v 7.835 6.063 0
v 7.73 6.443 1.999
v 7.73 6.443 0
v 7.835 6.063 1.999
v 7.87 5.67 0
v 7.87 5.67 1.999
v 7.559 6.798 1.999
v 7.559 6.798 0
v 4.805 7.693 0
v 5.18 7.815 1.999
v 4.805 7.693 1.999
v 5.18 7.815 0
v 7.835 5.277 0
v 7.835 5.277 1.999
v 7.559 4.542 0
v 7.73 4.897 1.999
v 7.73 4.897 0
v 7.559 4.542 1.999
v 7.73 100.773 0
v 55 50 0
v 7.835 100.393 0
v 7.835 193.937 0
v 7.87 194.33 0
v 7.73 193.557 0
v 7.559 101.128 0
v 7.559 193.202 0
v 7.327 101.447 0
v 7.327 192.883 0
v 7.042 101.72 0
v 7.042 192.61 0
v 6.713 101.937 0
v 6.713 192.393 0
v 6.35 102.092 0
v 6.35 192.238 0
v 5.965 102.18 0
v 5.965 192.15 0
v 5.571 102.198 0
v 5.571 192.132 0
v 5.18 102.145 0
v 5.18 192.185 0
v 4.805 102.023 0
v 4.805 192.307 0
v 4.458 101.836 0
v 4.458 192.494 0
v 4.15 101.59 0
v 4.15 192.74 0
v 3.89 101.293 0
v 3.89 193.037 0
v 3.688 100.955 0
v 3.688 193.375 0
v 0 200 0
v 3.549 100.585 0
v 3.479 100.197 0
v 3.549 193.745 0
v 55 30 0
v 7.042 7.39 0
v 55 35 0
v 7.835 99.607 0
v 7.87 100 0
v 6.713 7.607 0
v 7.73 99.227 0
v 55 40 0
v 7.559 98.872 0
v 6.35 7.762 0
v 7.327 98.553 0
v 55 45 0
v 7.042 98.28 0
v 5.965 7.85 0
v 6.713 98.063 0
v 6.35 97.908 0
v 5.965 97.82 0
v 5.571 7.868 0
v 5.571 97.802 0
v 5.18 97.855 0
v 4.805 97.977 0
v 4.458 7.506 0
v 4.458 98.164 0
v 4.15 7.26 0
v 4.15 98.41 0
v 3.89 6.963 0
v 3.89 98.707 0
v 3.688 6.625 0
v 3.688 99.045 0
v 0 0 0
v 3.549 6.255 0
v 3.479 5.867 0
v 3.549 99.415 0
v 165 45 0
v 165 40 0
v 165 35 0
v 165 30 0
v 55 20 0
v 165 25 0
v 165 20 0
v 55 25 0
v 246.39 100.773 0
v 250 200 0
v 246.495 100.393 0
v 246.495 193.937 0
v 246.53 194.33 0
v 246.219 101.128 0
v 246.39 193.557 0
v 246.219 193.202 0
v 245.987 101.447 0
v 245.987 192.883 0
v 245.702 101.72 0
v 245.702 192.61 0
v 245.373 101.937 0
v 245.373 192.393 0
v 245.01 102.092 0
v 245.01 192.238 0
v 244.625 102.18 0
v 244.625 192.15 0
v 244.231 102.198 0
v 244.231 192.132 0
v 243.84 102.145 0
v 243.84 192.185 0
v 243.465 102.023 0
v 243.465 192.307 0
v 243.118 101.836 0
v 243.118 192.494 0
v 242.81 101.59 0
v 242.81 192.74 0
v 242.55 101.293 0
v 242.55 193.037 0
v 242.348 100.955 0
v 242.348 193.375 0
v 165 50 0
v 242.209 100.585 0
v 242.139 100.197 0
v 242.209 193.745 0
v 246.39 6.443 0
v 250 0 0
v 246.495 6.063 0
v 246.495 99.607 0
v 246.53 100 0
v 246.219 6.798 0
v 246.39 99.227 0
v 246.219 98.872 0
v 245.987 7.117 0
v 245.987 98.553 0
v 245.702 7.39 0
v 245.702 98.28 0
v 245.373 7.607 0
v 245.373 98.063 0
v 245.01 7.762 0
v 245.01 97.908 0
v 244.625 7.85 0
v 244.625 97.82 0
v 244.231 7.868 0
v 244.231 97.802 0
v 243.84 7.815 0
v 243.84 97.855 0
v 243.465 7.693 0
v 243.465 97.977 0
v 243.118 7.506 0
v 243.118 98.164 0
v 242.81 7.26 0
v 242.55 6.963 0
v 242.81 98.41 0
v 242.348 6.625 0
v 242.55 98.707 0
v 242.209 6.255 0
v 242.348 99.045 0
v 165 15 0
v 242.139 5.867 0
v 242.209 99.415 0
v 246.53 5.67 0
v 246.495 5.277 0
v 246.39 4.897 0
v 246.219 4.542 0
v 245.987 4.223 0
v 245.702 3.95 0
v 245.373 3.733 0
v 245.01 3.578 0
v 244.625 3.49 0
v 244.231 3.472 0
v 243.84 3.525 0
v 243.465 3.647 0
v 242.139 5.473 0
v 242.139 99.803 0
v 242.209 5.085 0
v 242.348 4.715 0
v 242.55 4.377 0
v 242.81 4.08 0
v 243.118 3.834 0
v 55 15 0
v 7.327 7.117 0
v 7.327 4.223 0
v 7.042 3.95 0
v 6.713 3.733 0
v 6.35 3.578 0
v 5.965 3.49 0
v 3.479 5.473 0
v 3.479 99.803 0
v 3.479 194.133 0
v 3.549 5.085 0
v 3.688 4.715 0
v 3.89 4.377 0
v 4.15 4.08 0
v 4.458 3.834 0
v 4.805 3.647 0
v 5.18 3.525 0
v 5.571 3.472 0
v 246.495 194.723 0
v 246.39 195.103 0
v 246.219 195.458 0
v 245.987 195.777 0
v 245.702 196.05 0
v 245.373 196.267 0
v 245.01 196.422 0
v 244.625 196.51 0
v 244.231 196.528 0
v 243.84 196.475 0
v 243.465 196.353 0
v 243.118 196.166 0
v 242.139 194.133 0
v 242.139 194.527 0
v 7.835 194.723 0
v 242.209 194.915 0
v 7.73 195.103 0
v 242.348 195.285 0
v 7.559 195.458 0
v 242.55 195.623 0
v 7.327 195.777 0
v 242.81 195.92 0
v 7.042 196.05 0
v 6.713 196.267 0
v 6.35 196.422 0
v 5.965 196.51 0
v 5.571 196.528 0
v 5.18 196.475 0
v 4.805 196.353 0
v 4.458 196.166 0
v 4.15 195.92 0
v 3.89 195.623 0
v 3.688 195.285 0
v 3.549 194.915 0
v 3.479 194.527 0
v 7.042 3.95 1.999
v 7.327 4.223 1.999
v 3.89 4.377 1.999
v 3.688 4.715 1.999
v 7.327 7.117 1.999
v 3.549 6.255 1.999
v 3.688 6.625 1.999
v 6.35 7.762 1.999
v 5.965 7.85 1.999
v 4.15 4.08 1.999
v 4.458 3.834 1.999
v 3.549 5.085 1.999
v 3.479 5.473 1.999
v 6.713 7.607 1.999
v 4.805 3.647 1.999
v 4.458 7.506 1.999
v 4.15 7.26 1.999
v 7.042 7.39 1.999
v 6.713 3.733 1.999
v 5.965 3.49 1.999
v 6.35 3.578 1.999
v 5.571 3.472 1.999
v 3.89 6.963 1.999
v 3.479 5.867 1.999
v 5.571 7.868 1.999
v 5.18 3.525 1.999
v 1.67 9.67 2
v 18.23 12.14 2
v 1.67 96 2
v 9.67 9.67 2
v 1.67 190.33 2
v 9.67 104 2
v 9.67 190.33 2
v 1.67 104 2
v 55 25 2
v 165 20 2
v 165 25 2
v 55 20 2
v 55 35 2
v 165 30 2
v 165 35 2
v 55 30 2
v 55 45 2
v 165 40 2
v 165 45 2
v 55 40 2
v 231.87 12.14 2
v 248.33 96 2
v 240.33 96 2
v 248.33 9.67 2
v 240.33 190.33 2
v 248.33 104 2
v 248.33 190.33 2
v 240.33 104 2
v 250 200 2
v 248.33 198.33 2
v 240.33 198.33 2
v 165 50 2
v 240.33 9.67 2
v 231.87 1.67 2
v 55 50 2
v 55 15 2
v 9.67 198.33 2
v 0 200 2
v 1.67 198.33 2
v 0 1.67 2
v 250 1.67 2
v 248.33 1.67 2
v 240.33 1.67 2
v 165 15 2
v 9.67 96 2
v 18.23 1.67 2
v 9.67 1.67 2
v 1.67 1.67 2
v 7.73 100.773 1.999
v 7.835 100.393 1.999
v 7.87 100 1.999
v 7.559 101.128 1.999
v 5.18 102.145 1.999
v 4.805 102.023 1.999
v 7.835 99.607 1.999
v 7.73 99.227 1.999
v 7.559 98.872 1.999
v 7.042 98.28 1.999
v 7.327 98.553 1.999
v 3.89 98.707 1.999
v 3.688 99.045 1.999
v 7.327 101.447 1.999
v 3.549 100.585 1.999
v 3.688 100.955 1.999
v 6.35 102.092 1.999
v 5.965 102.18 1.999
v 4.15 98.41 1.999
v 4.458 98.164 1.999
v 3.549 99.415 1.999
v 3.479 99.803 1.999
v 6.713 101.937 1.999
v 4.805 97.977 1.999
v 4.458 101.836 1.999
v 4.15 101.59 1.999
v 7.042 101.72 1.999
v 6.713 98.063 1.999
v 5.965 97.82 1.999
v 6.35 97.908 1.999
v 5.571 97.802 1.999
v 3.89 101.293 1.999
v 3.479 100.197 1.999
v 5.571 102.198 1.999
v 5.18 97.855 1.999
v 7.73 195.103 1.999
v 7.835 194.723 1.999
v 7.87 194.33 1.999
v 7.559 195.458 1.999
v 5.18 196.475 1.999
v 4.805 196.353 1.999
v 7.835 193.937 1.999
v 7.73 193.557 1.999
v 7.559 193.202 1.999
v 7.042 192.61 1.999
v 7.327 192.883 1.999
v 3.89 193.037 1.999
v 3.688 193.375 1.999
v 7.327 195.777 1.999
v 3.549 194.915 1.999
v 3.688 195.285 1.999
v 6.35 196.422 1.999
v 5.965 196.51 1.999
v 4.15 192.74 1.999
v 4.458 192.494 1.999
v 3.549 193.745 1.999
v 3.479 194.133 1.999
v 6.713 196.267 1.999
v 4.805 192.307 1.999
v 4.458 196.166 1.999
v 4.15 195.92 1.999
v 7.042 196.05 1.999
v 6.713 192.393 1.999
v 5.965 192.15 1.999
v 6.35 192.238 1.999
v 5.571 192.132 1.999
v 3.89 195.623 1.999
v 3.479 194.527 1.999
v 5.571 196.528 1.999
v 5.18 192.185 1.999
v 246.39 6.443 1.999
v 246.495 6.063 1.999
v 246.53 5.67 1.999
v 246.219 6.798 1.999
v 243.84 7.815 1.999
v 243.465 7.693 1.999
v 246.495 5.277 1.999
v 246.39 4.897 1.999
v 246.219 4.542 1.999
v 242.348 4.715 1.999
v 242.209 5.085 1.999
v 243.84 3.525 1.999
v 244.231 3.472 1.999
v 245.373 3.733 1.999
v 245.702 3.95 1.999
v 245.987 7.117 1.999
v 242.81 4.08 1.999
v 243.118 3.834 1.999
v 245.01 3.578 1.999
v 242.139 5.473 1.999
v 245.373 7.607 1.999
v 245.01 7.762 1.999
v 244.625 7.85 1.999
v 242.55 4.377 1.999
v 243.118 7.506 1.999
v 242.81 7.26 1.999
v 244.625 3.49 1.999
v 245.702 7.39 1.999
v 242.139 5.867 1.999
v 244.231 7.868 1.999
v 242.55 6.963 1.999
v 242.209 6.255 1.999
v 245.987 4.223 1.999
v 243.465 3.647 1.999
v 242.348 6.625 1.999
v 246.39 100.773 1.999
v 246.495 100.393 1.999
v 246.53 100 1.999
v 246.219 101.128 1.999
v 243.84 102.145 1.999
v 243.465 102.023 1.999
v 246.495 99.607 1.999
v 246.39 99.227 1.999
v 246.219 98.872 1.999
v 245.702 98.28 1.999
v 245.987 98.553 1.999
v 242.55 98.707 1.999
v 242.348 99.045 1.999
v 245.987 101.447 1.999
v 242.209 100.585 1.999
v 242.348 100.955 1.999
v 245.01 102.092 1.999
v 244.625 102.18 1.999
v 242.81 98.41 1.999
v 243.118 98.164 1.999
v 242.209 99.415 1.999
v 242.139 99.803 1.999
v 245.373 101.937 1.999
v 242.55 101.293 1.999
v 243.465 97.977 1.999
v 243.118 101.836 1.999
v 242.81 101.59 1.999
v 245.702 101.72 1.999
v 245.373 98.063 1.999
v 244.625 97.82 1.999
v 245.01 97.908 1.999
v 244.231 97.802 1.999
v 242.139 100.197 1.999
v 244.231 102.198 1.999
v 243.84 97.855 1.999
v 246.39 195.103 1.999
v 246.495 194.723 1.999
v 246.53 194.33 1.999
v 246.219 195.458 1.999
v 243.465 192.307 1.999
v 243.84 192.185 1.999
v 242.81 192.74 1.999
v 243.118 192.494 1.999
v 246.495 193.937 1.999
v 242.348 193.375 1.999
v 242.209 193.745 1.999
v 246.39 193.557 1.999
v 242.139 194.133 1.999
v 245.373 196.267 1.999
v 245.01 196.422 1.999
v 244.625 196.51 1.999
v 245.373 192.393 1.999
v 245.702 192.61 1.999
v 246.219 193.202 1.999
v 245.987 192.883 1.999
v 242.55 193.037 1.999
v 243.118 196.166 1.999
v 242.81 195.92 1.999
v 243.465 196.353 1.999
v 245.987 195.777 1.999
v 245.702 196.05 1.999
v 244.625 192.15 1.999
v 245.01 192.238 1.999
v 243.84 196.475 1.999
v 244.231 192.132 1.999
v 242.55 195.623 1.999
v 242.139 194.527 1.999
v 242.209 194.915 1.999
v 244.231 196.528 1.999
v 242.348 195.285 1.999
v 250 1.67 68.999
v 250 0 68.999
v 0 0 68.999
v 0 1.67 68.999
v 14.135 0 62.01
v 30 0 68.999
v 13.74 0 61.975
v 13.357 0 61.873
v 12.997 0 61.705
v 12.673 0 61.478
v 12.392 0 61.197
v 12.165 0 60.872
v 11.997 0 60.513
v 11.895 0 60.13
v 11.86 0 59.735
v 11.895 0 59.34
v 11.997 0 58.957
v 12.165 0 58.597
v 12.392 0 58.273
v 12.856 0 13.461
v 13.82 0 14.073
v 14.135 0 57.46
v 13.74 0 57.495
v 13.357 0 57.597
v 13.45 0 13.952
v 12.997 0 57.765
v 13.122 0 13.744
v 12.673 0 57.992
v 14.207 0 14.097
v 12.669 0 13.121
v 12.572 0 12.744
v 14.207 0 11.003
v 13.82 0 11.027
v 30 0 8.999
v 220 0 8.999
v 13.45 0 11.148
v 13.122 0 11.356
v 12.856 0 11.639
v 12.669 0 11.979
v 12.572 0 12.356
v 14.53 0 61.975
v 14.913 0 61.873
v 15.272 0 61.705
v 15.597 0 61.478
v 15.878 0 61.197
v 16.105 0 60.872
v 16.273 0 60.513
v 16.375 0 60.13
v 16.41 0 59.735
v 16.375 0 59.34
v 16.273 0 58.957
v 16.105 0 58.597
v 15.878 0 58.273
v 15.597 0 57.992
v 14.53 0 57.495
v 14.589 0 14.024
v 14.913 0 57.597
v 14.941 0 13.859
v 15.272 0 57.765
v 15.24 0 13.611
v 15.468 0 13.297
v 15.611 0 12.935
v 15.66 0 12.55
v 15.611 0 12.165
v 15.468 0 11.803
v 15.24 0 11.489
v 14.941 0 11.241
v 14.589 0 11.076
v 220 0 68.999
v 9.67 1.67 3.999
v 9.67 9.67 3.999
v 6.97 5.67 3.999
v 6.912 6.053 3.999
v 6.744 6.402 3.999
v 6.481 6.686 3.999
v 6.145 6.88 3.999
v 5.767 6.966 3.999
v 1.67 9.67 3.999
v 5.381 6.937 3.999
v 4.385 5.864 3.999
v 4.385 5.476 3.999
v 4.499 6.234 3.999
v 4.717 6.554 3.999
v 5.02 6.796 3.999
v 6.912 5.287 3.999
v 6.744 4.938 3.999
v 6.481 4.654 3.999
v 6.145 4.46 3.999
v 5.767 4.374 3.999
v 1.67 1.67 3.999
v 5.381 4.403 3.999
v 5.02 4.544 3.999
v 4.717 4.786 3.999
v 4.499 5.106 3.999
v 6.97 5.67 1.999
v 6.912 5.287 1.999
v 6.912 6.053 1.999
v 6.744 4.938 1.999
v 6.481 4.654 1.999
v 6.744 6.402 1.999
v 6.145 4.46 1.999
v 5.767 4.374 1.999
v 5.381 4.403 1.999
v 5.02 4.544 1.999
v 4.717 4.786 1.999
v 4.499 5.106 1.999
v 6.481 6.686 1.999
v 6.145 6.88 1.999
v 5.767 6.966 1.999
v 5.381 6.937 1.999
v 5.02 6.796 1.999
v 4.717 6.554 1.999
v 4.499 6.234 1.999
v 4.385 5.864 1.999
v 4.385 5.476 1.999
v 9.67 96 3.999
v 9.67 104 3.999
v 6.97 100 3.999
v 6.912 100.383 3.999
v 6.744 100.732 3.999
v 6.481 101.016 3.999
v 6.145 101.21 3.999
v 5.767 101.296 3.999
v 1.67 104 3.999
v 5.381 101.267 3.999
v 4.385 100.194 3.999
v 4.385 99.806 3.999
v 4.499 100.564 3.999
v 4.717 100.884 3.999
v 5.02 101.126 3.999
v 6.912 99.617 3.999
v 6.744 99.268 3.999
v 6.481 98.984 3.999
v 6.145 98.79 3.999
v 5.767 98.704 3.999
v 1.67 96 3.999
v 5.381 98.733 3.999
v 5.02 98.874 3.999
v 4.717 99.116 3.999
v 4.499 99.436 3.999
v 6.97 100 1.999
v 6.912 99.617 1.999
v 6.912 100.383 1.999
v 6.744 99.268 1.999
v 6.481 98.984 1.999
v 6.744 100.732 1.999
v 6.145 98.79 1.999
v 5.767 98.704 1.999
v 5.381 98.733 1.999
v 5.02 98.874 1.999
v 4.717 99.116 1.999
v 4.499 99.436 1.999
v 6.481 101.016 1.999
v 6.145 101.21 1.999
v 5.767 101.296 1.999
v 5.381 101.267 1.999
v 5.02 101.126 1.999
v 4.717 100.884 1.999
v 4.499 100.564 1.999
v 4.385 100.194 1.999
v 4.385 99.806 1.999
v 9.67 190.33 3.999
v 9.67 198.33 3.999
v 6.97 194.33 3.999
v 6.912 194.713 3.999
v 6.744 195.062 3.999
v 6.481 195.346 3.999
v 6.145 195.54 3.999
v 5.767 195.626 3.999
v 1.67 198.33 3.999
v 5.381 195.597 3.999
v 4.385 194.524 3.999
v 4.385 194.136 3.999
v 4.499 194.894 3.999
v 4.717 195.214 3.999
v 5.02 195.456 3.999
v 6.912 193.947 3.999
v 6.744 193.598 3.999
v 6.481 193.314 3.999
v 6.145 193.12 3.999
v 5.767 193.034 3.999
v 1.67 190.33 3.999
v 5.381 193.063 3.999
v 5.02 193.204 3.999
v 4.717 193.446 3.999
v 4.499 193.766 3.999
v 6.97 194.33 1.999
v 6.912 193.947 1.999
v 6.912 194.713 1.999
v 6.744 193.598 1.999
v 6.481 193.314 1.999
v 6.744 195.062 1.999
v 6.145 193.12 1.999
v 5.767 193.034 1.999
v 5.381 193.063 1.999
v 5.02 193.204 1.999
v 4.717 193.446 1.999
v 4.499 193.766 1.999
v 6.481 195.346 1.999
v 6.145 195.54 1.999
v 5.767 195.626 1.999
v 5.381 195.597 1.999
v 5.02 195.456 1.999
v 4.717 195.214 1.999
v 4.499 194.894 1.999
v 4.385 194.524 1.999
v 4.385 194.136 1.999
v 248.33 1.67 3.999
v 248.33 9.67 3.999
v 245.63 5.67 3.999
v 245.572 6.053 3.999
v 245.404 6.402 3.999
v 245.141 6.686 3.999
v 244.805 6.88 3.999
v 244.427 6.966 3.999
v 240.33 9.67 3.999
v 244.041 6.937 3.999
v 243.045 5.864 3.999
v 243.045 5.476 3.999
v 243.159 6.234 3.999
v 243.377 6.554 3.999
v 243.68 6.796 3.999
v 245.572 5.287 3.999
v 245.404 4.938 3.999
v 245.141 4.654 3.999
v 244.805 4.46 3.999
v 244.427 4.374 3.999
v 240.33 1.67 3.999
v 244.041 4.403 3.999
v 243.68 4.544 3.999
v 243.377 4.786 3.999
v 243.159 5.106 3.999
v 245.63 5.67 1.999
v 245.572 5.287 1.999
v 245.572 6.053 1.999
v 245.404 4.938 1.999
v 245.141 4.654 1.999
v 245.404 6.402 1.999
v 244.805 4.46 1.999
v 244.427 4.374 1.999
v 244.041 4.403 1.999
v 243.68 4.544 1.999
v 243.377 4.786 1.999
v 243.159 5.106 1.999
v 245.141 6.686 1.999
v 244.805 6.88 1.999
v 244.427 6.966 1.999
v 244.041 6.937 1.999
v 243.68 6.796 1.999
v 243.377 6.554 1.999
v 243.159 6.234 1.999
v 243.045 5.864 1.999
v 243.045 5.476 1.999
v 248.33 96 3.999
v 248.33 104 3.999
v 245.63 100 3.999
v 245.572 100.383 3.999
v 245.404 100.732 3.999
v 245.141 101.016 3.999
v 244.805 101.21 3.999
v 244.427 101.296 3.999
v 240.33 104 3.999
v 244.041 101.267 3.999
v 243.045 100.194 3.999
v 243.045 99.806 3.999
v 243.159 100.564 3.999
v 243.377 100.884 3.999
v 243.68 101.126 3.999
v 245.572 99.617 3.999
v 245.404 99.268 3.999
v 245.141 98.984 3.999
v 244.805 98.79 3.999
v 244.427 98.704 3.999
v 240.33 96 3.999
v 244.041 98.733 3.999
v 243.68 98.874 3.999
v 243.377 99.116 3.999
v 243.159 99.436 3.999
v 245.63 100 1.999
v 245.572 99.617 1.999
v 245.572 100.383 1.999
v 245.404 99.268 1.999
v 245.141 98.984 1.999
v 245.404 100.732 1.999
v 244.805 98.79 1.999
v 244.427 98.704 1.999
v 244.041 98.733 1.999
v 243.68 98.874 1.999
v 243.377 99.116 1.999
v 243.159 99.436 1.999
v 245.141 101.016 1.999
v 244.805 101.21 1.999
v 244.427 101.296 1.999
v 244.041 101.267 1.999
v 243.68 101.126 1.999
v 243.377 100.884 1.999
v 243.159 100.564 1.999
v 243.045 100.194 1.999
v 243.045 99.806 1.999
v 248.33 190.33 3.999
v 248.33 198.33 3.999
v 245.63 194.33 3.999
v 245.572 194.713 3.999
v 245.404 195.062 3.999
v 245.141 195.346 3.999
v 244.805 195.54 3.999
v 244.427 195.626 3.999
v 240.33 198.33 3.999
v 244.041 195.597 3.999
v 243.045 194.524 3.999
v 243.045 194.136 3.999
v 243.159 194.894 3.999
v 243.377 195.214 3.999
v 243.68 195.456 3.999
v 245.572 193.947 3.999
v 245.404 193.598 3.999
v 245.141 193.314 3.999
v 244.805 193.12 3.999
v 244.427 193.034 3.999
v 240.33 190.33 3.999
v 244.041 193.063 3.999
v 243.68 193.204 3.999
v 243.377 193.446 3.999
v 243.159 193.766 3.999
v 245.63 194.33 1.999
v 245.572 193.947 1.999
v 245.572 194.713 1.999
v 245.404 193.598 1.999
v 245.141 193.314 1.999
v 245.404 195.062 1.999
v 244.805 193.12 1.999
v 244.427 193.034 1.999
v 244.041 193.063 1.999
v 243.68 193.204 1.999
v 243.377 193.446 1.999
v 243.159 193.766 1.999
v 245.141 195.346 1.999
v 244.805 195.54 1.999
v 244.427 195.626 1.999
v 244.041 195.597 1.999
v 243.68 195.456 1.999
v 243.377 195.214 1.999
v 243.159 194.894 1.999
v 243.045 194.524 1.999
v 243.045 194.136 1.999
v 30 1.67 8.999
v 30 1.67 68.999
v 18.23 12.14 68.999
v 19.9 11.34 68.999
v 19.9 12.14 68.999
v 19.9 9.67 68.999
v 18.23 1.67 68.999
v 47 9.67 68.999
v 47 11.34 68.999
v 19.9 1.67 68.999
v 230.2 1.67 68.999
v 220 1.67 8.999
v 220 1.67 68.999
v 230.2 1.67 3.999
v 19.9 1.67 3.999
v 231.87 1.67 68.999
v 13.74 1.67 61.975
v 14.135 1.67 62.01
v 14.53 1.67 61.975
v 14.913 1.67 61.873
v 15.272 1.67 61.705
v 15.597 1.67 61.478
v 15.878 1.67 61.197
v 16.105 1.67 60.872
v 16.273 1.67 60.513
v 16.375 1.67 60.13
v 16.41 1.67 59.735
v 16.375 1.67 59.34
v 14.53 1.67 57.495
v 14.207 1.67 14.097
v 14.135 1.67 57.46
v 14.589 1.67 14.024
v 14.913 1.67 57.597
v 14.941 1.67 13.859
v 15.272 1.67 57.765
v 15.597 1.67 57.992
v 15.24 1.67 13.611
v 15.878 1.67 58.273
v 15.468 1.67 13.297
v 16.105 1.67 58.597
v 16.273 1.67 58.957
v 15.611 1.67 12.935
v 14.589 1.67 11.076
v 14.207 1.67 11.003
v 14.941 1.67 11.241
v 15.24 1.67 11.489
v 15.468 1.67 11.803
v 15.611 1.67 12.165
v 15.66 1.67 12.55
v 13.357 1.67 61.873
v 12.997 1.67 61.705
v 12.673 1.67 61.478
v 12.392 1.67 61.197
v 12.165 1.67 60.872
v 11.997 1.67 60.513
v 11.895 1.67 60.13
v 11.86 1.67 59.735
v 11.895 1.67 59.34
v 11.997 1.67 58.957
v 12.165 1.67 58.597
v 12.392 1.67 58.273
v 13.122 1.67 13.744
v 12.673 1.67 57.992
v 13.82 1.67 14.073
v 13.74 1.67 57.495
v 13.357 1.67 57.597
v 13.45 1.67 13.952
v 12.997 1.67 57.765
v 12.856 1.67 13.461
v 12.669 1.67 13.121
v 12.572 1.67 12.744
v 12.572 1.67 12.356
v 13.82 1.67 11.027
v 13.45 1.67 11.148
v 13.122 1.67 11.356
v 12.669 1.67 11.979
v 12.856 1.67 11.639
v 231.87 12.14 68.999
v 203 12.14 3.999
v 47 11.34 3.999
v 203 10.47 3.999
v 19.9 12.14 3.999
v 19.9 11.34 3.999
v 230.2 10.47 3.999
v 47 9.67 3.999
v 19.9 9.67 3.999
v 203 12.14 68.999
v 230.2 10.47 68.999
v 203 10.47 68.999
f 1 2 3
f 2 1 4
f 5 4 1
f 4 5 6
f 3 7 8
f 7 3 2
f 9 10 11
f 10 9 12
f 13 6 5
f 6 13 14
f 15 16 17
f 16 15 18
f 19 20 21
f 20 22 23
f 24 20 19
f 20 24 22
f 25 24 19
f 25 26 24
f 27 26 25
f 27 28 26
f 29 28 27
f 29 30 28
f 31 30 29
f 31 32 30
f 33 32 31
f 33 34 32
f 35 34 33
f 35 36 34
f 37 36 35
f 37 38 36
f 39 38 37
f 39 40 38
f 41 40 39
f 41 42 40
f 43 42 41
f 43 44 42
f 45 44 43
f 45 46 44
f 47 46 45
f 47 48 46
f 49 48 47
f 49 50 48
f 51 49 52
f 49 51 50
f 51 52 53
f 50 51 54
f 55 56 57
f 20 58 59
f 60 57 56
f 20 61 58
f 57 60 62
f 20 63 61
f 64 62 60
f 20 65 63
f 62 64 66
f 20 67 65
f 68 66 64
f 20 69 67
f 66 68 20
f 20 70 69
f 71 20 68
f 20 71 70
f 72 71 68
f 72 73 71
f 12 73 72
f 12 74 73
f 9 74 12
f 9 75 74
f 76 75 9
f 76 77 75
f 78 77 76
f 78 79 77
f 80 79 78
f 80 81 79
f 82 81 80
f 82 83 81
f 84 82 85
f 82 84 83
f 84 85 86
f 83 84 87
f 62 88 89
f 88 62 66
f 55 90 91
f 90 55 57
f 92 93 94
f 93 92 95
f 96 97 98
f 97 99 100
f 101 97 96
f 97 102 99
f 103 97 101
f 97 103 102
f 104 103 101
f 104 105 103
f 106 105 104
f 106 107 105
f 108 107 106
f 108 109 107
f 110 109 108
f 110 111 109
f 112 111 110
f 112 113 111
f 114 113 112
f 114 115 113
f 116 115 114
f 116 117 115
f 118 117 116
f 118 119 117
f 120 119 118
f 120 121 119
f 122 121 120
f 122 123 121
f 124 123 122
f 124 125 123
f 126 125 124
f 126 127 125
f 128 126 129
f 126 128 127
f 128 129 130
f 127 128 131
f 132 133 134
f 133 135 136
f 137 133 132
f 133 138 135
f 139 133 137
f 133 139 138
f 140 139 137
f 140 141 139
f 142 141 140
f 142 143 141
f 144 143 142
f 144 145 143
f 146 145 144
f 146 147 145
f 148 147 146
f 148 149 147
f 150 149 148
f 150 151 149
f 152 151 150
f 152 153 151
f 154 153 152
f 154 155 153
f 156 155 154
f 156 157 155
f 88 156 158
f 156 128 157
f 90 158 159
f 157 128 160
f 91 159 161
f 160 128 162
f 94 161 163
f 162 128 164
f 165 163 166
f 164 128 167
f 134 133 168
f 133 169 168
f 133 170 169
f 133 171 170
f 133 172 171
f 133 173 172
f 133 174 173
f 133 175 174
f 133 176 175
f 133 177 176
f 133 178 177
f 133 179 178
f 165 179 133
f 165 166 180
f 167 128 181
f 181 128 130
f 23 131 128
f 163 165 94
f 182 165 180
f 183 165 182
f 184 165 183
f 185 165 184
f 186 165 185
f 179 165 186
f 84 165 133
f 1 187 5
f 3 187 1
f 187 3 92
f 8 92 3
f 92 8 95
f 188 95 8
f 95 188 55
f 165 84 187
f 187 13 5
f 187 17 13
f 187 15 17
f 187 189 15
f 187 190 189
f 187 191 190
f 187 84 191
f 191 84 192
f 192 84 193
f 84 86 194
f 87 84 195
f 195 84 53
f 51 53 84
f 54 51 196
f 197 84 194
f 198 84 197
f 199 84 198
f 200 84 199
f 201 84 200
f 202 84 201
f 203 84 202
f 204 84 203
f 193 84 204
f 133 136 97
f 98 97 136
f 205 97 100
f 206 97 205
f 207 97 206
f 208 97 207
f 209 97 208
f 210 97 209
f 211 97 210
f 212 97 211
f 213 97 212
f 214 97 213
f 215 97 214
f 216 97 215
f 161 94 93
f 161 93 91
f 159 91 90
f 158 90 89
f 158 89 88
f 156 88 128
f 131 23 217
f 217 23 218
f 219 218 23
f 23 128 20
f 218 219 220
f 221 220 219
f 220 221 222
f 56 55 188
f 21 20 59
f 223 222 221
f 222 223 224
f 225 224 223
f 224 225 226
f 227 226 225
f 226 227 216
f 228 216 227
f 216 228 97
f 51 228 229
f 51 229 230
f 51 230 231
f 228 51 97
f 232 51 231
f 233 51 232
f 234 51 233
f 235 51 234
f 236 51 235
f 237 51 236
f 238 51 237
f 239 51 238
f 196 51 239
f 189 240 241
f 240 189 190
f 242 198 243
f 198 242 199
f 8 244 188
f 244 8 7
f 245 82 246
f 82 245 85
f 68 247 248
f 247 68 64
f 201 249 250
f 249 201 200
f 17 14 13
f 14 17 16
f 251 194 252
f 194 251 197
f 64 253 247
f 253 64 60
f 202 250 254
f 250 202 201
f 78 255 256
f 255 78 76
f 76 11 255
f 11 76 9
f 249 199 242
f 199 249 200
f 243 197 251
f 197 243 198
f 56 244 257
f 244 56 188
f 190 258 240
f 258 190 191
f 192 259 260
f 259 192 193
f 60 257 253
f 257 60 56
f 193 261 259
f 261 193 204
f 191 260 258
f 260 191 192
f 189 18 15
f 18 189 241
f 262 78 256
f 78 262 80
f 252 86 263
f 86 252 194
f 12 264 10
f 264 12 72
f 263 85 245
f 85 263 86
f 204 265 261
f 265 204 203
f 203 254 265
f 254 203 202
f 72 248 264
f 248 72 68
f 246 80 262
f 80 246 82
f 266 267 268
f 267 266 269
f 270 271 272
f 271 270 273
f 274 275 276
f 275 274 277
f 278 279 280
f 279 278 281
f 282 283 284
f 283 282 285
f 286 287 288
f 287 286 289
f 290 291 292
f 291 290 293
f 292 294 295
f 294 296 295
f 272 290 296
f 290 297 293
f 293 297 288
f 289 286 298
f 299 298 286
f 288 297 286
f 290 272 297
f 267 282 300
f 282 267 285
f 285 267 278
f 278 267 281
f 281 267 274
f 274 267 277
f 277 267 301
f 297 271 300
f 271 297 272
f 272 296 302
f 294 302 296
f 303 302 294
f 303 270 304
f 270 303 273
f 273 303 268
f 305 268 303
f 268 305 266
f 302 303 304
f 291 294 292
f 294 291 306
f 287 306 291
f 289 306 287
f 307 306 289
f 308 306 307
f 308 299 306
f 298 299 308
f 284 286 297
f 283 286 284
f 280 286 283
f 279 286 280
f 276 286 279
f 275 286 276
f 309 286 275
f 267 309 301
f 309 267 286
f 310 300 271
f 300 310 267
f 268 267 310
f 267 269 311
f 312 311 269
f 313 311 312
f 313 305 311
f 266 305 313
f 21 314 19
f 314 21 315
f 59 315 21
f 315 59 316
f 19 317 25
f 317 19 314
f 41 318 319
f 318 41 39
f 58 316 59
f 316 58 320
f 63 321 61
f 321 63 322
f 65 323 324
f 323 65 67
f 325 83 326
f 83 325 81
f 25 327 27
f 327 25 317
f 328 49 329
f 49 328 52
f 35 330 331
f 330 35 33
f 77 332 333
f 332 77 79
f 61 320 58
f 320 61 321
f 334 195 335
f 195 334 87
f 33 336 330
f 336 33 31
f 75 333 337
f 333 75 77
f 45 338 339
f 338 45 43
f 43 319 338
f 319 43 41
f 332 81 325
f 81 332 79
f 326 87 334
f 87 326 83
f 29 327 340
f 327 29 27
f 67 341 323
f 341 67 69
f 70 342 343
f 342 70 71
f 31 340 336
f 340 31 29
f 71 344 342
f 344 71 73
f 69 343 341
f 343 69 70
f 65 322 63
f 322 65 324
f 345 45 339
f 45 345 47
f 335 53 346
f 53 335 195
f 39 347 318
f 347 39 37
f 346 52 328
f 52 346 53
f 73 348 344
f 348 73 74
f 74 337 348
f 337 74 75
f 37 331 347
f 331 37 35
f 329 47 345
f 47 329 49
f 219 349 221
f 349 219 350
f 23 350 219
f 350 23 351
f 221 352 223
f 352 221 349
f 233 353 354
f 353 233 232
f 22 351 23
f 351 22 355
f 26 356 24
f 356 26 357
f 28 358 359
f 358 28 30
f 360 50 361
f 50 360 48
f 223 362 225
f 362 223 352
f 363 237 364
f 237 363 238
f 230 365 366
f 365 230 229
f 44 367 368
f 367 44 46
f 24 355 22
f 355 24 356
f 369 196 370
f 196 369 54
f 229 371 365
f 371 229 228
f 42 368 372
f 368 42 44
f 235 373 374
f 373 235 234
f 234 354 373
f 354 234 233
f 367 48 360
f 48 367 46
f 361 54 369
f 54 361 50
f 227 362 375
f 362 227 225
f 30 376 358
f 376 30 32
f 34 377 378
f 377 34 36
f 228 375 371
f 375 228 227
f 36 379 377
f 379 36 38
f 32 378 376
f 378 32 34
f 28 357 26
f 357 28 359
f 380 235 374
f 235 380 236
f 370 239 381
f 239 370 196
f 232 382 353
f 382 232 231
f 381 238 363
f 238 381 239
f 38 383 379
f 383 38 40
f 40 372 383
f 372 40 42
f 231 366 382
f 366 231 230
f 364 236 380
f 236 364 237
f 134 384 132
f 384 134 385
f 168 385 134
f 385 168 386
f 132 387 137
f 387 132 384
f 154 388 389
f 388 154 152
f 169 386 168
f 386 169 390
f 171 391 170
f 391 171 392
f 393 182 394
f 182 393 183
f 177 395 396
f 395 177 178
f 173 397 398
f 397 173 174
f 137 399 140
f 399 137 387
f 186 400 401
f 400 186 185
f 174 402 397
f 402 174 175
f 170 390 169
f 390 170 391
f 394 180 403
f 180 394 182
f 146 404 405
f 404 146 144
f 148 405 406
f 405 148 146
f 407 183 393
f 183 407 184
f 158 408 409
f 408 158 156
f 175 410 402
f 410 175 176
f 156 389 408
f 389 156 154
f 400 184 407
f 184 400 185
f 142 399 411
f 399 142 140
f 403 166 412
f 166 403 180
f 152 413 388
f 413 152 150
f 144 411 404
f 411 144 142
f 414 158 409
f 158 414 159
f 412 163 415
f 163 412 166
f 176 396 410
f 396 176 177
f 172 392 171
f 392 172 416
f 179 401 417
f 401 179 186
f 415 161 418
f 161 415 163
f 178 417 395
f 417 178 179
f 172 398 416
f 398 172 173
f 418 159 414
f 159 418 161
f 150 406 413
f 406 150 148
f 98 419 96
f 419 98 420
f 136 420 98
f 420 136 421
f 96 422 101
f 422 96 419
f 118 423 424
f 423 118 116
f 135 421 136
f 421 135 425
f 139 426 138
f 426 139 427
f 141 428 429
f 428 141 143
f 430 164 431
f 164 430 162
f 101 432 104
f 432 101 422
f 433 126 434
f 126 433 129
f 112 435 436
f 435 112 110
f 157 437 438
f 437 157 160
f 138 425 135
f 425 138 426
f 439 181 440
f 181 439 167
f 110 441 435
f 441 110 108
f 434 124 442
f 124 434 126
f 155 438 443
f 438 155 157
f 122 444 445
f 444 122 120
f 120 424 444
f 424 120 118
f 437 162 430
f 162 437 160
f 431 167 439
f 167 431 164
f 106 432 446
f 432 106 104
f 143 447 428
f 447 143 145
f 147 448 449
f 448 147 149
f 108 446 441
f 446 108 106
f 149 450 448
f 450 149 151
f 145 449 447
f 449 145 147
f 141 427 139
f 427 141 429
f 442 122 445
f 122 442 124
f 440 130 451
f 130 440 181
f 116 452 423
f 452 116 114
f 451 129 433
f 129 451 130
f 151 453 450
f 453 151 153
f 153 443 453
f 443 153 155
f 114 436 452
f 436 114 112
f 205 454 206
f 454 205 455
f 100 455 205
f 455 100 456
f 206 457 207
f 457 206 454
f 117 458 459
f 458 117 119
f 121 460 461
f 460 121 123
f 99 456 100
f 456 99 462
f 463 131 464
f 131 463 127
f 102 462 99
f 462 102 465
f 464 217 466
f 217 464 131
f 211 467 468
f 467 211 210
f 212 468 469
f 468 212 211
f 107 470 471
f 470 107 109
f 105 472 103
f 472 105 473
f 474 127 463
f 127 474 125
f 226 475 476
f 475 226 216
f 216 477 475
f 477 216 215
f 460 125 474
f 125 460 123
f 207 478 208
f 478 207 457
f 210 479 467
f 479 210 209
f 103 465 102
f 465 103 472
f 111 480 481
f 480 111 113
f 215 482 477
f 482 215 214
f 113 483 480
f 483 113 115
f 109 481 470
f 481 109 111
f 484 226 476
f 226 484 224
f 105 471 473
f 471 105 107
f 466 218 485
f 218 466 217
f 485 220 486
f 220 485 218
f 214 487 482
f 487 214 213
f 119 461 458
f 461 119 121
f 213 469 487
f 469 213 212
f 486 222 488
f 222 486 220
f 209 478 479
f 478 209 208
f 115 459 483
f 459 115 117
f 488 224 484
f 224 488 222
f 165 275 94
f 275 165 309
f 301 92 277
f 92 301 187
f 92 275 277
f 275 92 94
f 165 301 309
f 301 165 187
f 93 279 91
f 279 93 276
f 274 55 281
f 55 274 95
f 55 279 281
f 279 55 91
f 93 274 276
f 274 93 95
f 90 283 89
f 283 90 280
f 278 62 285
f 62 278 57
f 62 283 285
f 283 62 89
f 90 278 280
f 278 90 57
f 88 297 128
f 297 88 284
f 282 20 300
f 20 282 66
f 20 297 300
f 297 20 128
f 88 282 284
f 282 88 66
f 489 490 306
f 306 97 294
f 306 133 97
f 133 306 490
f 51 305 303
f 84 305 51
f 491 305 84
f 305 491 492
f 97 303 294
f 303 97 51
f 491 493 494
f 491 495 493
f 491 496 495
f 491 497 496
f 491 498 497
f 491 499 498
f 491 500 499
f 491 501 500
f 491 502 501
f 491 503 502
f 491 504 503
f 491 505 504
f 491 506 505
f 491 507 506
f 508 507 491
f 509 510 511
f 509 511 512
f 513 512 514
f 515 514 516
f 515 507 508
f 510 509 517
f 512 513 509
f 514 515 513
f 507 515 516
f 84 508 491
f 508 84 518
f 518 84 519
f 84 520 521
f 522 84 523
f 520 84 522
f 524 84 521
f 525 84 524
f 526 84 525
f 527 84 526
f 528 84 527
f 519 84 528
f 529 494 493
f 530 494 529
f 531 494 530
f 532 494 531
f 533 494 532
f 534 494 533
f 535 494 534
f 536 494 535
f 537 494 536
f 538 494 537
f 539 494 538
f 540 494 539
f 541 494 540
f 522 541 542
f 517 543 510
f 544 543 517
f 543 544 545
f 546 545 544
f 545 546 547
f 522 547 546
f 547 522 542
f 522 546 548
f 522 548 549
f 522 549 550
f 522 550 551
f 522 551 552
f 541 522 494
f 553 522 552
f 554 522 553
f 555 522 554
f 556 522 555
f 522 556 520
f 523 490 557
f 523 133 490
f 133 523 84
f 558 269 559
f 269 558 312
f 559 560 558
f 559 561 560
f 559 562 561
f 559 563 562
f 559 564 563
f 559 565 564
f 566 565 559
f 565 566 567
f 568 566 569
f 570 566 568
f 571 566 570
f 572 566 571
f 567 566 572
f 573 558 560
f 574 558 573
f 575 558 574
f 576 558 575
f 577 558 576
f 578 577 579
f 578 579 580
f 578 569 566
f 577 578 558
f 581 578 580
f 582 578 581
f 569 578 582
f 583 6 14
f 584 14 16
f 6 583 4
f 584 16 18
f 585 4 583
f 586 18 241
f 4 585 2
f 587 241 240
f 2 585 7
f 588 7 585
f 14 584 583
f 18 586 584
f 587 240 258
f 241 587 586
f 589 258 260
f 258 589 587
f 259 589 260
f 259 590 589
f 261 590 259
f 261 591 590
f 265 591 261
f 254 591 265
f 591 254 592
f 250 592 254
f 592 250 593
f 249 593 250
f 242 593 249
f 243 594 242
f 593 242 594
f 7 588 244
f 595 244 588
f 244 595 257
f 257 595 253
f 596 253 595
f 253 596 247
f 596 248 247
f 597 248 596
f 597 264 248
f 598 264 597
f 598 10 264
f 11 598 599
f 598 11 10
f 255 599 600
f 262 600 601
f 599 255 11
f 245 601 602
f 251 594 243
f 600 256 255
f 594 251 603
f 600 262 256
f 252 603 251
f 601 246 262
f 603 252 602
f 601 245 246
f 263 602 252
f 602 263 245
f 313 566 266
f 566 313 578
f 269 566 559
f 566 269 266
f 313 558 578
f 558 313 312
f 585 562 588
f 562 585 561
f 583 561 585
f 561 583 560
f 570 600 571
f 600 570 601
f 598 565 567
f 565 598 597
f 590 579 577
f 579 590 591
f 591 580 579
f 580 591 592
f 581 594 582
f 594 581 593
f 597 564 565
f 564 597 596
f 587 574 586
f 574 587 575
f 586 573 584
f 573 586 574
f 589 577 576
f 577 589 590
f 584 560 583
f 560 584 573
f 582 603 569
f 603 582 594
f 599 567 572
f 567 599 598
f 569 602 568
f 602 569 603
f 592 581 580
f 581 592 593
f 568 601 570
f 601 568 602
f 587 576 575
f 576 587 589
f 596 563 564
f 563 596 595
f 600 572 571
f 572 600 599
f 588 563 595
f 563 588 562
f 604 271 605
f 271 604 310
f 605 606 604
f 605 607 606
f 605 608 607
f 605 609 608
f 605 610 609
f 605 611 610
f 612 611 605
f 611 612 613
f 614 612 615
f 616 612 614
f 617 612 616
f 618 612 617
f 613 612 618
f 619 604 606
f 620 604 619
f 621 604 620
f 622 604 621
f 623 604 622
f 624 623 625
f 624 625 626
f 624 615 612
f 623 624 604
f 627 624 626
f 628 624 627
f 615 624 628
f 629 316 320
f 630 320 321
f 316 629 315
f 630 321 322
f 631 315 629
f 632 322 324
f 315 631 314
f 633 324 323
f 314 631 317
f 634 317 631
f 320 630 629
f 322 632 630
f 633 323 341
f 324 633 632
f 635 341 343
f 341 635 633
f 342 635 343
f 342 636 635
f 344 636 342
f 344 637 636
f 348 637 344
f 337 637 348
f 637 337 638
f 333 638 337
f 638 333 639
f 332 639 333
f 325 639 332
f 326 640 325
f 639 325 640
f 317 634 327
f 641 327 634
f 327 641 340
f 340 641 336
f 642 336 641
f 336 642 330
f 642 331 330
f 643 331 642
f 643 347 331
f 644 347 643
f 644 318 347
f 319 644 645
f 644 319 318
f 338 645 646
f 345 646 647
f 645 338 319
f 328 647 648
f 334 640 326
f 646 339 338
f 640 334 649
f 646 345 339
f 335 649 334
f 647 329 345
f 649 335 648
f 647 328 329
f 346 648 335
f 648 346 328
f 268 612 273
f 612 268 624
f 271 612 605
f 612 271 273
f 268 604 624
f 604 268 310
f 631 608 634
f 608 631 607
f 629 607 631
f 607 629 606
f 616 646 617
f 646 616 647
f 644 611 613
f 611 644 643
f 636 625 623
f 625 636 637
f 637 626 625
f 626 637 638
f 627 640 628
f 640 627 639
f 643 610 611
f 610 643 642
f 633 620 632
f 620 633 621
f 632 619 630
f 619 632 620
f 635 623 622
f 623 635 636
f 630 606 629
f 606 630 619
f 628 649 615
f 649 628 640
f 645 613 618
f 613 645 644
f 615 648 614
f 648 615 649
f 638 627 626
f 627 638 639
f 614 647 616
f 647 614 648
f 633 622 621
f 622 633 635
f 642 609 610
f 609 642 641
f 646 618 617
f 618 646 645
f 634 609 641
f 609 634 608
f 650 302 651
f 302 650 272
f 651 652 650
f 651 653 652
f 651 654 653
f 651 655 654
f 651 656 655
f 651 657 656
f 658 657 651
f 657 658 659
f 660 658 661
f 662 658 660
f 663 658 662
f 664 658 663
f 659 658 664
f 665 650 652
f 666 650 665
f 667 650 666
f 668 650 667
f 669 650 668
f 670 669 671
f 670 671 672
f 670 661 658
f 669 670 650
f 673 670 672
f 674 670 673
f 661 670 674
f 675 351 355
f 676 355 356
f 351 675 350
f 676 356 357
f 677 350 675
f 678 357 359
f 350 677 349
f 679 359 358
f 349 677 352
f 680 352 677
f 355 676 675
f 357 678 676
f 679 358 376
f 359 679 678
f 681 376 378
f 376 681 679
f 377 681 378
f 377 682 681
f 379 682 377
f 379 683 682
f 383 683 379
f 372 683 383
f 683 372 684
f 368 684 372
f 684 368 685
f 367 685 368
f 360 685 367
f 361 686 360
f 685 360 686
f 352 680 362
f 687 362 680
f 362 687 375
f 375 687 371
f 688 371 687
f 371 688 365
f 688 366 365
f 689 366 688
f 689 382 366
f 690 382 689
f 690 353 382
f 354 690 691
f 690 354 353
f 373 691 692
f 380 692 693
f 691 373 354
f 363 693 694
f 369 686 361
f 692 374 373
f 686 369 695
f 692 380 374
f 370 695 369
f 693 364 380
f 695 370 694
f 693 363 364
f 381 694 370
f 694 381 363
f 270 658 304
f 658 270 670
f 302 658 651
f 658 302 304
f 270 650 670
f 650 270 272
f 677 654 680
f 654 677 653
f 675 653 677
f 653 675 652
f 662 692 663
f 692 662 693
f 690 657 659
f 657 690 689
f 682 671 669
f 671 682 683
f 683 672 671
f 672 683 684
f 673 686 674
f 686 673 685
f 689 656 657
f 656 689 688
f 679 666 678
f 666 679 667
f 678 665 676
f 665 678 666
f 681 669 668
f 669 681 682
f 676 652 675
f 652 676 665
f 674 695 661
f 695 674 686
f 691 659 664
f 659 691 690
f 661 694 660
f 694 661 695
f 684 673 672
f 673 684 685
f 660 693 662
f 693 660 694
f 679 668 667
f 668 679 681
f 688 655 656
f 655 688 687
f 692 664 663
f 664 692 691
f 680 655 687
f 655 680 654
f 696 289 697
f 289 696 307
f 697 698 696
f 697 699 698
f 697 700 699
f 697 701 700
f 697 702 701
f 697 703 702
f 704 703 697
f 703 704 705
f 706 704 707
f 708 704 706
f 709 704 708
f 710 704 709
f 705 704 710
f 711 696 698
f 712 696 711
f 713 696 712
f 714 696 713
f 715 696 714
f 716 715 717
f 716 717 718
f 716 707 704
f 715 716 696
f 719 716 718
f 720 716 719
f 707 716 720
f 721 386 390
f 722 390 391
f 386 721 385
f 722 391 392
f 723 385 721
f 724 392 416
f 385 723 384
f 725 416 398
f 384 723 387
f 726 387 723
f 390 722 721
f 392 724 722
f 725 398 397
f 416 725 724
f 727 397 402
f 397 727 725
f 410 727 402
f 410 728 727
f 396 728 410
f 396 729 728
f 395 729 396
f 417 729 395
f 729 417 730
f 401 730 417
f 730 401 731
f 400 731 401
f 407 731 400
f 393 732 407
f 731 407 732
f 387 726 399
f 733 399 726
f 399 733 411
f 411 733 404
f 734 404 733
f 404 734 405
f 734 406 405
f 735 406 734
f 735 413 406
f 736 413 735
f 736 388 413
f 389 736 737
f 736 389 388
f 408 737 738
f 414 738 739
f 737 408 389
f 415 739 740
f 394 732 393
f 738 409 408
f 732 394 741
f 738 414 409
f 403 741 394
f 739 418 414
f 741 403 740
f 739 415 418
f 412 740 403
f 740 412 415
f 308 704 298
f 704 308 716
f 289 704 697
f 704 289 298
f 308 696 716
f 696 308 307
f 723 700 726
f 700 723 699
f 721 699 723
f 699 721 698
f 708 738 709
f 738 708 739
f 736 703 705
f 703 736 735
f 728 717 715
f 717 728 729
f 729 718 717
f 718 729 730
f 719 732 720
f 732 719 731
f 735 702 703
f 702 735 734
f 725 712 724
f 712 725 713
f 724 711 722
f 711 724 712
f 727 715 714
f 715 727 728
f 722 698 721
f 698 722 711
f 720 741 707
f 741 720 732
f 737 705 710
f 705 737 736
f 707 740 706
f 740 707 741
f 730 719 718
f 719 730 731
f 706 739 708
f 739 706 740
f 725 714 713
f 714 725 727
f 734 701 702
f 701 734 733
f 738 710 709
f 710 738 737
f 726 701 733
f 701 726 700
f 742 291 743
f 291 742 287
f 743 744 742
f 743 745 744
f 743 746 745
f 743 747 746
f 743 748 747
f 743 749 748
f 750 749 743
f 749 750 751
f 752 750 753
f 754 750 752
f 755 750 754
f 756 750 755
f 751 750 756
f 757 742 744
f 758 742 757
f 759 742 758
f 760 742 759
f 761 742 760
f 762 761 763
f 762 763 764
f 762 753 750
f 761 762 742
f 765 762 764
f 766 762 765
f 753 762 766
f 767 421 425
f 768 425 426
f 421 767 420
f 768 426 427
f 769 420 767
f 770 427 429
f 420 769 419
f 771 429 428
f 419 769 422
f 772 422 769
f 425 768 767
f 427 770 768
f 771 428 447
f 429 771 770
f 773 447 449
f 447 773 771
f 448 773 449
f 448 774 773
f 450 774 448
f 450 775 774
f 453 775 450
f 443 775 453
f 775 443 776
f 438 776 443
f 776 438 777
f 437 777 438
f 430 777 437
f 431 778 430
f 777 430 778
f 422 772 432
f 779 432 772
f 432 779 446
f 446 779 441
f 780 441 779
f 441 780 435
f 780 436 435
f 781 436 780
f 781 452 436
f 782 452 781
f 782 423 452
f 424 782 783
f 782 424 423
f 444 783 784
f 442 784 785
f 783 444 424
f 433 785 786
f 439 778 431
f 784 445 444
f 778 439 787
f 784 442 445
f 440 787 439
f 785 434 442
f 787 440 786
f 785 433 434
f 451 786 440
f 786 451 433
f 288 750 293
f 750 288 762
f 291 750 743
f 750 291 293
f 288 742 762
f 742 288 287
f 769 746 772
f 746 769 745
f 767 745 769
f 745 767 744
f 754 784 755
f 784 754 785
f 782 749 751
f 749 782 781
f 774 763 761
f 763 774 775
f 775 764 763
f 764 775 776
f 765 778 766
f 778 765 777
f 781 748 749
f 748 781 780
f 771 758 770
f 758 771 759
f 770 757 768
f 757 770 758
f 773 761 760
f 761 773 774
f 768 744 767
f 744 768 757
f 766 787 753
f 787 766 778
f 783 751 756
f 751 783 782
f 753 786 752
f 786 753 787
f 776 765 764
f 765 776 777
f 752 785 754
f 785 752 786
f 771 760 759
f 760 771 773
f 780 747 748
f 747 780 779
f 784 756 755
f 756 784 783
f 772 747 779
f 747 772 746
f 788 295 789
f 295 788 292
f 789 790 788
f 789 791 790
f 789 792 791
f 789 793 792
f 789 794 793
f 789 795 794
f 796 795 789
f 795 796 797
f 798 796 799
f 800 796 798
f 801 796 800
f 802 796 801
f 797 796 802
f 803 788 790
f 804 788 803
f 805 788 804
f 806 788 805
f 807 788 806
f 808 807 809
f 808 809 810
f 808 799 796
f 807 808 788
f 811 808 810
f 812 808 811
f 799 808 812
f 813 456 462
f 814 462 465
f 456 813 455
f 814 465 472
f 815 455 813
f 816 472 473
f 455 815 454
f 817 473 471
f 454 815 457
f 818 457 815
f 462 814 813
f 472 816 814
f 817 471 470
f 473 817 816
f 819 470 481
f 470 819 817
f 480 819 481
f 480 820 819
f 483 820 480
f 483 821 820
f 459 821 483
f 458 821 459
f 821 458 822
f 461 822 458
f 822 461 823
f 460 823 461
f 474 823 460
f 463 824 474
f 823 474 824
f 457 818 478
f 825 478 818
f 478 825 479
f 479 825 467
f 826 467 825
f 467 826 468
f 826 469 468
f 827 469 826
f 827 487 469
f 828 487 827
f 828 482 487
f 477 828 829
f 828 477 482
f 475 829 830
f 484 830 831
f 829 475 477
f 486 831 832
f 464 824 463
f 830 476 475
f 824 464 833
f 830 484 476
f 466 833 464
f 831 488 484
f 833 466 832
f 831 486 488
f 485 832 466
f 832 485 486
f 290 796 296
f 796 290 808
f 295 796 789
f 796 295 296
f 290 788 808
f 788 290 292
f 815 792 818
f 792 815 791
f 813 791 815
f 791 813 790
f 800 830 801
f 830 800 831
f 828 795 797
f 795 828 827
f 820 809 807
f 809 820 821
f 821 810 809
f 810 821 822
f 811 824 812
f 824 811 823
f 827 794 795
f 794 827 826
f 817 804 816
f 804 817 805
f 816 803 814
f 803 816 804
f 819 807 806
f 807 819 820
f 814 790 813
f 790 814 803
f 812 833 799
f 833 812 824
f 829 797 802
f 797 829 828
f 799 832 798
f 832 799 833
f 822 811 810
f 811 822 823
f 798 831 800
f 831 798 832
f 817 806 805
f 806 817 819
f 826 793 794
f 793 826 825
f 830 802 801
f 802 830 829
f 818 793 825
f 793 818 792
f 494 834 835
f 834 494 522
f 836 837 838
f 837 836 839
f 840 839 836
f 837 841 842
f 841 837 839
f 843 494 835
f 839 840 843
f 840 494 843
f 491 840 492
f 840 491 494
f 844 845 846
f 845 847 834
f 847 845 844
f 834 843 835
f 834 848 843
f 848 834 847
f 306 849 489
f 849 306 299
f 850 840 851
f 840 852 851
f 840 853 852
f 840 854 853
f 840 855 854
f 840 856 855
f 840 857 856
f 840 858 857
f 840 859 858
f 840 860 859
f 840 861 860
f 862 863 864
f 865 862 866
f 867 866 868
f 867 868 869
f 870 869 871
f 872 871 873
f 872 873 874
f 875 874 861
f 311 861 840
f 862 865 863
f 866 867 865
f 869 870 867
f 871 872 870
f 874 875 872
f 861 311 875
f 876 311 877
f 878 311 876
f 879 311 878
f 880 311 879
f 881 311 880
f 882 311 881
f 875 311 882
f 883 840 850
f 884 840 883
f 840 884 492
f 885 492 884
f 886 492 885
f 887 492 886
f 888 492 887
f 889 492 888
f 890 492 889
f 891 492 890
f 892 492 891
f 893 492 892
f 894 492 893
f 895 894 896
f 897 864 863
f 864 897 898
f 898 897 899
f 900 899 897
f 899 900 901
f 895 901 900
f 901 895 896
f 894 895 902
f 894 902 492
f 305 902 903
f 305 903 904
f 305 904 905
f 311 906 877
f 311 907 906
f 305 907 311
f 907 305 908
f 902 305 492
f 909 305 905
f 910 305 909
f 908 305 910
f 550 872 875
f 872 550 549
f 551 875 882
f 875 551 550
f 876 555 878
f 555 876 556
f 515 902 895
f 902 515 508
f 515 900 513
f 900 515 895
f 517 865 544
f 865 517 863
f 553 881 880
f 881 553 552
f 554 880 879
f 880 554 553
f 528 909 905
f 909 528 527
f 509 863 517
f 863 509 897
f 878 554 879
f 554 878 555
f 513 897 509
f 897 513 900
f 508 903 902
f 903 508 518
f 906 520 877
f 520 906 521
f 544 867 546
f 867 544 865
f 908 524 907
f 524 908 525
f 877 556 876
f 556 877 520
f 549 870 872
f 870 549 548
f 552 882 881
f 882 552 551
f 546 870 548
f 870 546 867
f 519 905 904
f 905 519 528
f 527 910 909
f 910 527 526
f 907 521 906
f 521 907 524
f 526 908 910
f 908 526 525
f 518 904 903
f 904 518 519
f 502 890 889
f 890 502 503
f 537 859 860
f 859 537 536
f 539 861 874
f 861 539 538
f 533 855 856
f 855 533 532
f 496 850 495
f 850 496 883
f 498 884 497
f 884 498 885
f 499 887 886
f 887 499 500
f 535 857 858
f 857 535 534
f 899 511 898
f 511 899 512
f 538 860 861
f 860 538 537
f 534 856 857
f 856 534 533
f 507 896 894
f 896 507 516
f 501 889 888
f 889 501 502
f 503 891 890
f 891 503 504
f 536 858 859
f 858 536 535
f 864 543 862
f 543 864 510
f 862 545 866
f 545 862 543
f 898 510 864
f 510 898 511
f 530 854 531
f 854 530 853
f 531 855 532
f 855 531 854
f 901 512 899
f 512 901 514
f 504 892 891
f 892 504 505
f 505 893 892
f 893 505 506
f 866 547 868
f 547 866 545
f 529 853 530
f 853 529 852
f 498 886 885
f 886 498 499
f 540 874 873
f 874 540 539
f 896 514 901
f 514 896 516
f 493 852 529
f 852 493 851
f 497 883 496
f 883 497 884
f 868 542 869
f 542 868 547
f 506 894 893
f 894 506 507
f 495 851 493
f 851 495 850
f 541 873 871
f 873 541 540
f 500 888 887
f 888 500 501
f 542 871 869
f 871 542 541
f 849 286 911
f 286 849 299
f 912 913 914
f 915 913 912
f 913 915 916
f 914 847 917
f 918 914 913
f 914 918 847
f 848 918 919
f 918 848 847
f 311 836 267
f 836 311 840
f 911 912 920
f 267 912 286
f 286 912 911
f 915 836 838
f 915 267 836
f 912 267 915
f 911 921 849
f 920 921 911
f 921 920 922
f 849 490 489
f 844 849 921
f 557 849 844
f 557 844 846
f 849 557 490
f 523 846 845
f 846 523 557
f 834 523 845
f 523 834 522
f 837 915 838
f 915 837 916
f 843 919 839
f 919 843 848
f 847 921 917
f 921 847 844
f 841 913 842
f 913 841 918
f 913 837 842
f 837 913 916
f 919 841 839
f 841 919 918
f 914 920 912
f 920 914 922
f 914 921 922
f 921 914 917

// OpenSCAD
// -----------------------------------------------------------------------------
// 3D-Model (OpenSCAD) of bottom
//
// Author: Bernhard Bablok
// License: GPL3
//
// Website: https://github.com/bablokb/pi-webradio
//
// -----------------------------------------------------------------------------

$fa = 1;
$fs = 0.4;

w4 = 1.67;    // wall thickness 4 layers
fuzz = 0.001; // fuzzing to ensure overlap

// --- module cyl_00: noncentered cylinder   -----------------------------------

module cyl_00(h,d,plane="xy") {
  r00 = d/2.0;
  if (plane == "xy")
    translate([r00,r00,0]) cylinder(h=h,r=r00,center=false);
  else if (plane == "yz")
    translate([0,h,0]) rotate([90,0,0]) cyl_00(h,d);
}

// --- module screw_plate: inner plate for screw   -----------------------------

module screw_plate(s,d) {
  difference() {
    cube([s,s,2]);
    translate([(s-d)/2,(s-d)/2,0]) cyl_00(2,d);
  }
}

// --- base plate   -------------------------------------------------------------

difference() {
  color("red") cube([250,200,2]);

  // holes for screws
  d_screw = 4.4;
  for (dx=[3.47,242.13]) {
    for (dy=[3.47,97.8,192.13]) {
      translate([dx,dy,0])
          cyl_00(2,4.4);
    }
  }
 
  // ventilation
  v_depth = 5;
  for (dy=[15:10:45]) {
    translate([55,dy,0]) cube([110,5,2]);
  }
}
translate([18.23,0,2-fuzz]) cube([213.64,12.14,2]);

// --- screw-plates   ---------------------------------------------------------

color("green") for (dx=[w4,240.33]) {
  for (dy=[w4,96,190.33]) {
    translate([dx,dy,2-fuzz])
        screw_plate(8,2.6);
  }
}

// --- front walls   ----------------------------------------------------------

difference() {
  color("orange") translate([0,0,2-fuzz]) cube([30,w4,67]);
  // --- LED hole   -----------------------------------------------------------
  translate([12.56,0,11]) cyl_00(w4,3.1,plane="yz");
  // --- IR hole   ------------------------------------------------------------
  translate([11.86,0,57.46]) cyl_00(w4,4.55,plane="yz");
}
color("orange") translate([220,0,2-fuzz]) cube([30,w4,67]);
color("pink") translate([0,0,2-fuzz]) cube([250,w4,7]);

// --- screen holder (small diffs between left/right are due to the screen   --

color("brown") translate([18.23,0,2-fuzz]) cube([w4,12.14,67]);
color("brown") translate([230.20,0,2-fuzz]) cube([w4,12.14,67]);
color("brown") translate([18.23,9.67,2-fuzz]) cube([28.77,w4,67]);
color("brown") translate([203,10.47,2-fuzz]) cube([28.87,w4,67]);
